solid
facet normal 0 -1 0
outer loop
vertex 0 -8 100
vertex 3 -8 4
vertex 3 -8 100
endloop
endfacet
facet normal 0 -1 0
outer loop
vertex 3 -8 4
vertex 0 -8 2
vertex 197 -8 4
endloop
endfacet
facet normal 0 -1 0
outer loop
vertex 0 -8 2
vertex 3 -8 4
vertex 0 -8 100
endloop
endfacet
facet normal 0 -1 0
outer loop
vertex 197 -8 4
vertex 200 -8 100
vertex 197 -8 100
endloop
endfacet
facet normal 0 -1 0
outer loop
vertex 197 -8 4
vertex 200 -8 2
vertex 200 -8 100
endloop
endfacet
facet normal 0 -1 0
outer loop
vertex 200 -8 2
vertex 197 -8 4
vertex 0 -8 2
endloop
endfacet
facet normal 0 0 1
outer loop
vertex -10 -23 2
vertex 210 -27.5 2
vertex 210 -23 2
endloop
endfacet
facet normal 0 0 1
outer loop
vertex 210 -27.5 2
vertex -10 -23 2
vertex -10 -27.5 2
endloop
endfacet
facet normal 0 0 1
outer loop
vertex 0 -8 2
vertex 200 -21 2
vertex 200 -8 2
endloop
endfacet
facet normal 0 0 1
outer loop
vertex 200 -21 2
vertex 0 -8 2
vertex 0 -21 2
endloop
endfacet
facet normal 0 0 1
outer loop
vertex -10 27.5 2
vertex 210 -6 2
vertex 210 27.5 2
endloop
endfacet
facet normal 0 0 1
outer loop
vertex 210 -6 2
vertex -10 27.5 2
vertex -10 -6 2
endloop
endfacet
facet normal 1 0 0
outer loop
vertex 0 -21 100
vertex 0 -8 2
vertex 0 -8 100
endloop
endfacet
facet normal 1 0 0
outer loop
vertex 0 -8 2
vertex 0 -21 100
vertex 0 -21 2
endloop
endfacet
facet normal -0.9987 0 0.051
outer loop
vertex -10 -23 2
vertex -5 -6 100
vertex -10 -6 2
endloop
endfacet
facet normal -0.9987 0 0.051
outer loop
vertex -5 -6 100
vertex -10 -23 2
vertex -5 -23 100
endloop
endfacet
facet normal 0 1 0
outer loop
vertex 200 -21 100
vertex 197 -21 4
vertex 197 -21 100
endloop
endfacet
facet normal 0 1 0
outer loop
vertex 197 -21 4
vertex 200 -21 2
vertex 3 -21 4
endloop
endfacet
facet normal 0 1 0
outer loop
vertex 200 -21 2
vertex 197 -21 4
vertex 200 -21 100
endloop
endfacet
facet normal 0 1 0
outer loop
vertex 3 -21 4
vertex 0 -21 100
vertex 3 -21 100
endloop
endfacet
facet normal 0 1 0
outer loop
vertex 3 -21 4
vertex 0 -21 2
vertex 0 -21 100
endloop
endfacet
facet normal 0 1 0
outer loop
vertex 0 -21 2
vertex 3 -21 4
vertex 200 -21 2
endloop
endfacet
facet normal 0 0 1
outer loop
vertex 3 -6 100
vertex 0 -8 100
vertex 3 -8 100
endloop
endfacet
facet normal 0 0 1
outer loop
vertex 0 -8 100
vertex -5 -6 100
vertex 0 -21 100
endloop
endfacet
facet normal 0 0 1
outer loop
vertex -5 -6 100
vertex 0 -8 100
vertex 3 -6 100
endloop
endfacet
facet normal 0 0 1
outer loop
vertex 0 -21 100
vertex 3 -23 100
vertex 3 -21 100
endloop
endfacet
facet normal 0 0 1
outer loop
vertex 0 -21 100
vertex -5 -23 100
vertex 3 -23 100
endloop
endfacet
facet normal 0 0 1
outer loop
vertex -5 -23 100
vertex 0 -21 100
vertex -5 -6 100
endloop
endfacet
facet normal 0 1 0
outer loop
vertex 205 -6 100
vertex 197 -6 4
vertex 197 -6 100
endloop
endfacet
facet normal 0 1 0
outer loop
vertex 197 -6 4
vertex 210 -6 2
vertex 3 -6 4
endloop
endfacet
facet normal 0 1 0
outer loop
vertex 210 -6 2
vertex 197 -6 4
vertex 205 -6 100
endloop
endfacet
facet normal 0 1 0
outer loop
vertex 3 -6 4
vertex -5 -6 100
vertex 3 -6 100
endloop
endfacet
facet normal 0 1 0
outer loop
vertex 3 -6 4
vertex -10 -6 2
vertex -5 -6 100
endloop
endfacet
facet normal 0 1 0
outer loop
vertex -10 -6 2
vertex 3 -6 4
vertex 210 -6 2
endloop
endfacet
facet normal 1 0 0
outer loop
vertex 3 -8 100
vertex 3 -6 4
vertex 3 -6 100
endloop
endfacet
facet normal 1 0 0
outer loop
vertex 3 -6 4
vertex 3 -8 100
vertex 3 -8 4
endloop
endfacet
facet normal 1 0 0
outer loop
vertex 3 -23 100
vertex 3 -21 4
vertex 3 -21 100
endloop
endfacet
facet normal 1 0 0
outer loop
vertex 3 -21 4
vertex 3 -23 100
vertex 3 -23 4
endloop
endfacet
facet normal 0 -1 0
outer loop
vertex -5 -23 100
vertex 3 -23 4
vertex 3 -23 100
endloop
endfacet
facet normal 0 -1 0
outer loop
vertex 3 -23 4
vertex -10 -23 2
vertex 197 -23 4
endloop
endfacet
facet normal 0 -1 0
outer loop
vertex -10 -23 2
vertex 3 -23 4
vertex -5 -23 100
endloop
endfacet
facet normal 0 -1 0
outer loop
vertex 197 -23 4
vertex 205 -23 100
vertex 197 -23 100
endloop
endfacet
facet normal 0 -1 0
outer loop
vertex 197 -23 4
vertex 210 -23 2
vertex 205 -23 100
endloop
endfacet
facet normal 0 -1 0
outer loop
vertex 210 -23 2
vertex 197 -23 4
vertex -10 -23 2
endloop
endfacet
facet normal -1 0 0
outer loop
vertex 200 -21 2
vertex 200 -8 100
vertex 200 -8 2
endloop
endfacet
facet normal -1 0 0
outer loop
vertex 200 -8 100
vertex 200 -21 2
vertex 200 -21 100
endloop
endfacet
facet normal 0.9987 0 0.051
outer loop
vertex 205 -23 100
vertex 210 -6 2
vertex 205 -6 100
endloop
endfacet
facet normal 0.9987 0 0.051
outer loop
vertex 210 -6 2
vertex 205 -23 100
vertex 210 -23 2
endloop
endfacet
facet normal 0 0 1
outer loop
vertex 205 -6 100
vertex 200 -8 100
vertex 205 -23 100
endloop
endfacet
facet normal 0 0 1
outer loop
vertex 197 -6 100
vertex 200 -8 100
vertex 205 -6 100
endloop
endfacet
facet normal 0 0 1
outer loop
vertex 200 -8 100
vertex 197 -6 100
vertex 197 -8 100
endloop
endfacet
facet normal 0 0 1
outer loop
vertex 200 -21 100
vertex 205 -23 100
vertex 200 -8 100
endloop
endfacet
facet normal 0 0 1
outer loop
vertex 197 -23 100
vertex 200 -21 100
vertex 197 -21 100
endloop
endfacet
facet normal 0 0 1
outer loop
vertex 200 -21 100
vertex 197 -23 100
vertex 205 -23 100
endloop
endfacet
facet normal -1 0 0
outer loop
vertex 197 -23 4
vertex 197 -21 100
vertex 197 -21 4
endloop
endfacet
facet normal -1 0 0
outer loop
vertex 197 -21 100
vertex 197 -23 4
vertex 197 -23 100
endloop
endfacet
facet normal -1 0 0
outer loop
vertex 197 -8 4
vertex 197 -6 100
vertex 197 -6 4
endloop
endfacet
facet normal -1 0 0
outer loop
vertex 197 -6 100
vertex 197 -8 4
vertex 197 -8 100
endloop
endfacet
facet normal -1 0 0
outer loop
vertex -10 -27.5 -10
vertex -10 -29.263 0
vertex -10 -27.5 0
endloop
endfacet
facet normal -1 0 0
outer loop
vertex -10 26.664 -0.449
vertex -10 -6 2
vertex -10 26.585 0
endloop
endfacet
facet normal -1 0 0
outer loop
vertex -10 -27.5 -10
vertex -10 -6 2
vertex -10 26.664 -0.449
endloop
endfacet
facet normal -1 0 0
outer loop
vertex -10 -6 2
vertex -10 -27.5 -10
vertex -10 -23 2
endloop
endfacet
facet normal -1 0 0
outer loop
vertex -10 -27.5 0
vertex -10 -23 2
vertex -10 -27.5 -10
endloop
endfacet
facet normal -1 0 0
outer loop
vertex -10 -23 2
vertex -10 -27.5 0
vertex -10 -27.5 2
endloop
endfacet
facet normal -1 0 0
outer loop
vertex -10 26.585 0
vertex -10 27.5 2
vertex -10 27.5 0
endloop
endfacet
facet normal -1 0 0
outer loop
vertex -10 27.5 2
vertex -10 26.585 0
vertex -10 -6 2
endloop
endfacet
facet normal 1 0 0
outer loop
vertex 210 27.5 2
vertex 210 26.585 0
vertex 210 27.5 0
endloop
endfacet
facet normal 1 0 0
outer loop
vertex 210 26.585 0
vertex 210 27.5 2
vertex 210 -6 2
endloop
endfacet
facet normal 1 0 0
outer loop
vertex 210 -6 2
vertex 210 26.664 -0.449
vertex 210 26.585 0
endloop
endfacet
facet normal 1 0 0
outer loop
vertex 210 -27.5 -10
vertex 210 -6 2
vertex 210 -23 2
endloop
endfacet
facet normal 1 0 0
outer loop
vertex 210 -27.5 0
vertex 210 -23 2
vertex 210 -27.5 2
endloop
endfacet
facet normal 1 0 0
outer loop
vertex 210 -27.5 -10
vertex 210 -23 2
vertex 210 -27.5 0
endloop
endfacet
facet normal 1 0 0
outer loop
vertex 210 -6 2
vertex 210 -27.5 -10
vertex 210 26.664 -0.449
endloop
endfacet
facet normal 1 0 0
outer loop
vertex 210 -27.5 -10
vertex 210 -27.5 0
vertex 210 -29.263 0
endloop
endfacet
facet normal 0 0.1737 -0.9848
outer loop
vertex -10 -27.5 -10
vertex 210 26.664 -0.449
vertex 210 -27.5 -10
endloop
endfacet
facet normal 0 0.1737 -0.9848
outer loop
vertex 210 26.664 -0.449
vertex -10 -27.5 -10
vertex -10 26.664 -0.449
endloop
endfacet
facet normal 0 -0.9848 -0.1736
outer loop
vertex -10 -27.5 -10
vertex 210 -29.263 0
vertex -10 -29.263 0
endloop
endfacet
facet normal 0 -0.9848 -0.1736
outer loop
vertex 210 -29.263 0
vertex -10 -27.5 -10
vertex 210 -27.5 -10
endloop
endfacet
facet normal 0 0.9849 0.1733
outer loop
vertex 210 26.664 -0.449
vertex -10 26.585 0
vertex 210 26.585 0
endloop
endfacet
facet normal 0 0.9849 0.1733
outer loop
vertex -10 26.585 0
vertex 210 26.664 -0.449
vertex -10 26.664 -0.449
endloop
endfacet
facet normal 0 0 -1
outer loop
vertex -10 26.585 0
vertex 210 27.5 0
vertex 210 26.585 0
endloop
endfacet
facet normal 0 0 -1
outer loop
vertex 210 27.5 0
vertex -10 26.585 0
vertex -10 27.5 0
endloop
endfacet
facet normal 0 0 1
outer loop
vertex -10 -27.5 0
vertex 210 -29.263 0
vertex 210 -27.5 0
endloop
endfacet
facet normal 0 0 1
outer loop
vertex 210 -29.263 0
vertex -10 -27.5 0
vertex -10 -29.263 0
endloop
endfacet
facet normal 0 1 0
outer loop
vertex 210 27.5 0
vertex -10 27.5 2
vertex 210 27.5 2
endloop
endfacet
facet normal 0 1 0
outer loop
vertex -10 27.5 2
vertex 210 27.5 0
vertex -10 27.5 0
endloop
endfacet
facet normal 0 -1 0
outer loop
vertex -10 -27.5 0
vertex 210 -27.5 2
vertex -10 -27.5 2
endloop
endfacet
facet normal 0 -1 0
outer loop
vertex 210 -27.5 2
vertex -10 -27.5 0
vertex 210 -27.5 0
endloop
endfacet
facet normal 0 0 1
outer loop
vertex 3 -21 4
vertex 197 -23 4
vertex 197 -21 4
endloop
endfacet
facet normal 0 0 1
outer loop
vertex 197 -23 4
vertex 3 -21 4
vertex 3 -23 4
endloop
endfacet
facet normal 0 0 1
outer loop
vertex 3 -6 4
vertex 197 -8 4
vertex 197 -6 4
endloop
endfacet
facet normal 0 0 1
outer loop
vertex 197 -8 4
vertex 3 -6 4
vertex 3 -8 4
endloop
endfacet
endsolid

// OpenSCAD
$fa = 1;
$fs = 0.5;
$fn = 50;

module support() {
  translate([0,0,0]) rotate([90,0,0]) linear_extrude(13) polygon([[0,2],[5,100],[10,100],[10,2]]);
  translate([0,2,0]) rotate([90,0,0]) linear_extrude(2) polygon([[0,2],[5,100],[13,100],[13,2]]);
  translate([0,-13,0]) rotate([90,0,0]) linear_extrude(2) polygon([[0,2],[5,100],[13,100],[13,2]]);
}
  

translate([-10,-25-5/2,0]) cube([220,55,2]);
translate([-10,-8,0]) support();
translate([210,-21,0]) rotate([0,0,180]) support();
translate([0,-23,2]) cube([200,2,2]);
translate([0,-8,2]) cube([200,2,2]);

translate([0,0,-10]) difference() {
  translate([-10,-25-5/2,0]) rotate([10,0,0]) cube([220,55,15]);
  translate([-11,-35,10]) cube([222,80,20]);
}
